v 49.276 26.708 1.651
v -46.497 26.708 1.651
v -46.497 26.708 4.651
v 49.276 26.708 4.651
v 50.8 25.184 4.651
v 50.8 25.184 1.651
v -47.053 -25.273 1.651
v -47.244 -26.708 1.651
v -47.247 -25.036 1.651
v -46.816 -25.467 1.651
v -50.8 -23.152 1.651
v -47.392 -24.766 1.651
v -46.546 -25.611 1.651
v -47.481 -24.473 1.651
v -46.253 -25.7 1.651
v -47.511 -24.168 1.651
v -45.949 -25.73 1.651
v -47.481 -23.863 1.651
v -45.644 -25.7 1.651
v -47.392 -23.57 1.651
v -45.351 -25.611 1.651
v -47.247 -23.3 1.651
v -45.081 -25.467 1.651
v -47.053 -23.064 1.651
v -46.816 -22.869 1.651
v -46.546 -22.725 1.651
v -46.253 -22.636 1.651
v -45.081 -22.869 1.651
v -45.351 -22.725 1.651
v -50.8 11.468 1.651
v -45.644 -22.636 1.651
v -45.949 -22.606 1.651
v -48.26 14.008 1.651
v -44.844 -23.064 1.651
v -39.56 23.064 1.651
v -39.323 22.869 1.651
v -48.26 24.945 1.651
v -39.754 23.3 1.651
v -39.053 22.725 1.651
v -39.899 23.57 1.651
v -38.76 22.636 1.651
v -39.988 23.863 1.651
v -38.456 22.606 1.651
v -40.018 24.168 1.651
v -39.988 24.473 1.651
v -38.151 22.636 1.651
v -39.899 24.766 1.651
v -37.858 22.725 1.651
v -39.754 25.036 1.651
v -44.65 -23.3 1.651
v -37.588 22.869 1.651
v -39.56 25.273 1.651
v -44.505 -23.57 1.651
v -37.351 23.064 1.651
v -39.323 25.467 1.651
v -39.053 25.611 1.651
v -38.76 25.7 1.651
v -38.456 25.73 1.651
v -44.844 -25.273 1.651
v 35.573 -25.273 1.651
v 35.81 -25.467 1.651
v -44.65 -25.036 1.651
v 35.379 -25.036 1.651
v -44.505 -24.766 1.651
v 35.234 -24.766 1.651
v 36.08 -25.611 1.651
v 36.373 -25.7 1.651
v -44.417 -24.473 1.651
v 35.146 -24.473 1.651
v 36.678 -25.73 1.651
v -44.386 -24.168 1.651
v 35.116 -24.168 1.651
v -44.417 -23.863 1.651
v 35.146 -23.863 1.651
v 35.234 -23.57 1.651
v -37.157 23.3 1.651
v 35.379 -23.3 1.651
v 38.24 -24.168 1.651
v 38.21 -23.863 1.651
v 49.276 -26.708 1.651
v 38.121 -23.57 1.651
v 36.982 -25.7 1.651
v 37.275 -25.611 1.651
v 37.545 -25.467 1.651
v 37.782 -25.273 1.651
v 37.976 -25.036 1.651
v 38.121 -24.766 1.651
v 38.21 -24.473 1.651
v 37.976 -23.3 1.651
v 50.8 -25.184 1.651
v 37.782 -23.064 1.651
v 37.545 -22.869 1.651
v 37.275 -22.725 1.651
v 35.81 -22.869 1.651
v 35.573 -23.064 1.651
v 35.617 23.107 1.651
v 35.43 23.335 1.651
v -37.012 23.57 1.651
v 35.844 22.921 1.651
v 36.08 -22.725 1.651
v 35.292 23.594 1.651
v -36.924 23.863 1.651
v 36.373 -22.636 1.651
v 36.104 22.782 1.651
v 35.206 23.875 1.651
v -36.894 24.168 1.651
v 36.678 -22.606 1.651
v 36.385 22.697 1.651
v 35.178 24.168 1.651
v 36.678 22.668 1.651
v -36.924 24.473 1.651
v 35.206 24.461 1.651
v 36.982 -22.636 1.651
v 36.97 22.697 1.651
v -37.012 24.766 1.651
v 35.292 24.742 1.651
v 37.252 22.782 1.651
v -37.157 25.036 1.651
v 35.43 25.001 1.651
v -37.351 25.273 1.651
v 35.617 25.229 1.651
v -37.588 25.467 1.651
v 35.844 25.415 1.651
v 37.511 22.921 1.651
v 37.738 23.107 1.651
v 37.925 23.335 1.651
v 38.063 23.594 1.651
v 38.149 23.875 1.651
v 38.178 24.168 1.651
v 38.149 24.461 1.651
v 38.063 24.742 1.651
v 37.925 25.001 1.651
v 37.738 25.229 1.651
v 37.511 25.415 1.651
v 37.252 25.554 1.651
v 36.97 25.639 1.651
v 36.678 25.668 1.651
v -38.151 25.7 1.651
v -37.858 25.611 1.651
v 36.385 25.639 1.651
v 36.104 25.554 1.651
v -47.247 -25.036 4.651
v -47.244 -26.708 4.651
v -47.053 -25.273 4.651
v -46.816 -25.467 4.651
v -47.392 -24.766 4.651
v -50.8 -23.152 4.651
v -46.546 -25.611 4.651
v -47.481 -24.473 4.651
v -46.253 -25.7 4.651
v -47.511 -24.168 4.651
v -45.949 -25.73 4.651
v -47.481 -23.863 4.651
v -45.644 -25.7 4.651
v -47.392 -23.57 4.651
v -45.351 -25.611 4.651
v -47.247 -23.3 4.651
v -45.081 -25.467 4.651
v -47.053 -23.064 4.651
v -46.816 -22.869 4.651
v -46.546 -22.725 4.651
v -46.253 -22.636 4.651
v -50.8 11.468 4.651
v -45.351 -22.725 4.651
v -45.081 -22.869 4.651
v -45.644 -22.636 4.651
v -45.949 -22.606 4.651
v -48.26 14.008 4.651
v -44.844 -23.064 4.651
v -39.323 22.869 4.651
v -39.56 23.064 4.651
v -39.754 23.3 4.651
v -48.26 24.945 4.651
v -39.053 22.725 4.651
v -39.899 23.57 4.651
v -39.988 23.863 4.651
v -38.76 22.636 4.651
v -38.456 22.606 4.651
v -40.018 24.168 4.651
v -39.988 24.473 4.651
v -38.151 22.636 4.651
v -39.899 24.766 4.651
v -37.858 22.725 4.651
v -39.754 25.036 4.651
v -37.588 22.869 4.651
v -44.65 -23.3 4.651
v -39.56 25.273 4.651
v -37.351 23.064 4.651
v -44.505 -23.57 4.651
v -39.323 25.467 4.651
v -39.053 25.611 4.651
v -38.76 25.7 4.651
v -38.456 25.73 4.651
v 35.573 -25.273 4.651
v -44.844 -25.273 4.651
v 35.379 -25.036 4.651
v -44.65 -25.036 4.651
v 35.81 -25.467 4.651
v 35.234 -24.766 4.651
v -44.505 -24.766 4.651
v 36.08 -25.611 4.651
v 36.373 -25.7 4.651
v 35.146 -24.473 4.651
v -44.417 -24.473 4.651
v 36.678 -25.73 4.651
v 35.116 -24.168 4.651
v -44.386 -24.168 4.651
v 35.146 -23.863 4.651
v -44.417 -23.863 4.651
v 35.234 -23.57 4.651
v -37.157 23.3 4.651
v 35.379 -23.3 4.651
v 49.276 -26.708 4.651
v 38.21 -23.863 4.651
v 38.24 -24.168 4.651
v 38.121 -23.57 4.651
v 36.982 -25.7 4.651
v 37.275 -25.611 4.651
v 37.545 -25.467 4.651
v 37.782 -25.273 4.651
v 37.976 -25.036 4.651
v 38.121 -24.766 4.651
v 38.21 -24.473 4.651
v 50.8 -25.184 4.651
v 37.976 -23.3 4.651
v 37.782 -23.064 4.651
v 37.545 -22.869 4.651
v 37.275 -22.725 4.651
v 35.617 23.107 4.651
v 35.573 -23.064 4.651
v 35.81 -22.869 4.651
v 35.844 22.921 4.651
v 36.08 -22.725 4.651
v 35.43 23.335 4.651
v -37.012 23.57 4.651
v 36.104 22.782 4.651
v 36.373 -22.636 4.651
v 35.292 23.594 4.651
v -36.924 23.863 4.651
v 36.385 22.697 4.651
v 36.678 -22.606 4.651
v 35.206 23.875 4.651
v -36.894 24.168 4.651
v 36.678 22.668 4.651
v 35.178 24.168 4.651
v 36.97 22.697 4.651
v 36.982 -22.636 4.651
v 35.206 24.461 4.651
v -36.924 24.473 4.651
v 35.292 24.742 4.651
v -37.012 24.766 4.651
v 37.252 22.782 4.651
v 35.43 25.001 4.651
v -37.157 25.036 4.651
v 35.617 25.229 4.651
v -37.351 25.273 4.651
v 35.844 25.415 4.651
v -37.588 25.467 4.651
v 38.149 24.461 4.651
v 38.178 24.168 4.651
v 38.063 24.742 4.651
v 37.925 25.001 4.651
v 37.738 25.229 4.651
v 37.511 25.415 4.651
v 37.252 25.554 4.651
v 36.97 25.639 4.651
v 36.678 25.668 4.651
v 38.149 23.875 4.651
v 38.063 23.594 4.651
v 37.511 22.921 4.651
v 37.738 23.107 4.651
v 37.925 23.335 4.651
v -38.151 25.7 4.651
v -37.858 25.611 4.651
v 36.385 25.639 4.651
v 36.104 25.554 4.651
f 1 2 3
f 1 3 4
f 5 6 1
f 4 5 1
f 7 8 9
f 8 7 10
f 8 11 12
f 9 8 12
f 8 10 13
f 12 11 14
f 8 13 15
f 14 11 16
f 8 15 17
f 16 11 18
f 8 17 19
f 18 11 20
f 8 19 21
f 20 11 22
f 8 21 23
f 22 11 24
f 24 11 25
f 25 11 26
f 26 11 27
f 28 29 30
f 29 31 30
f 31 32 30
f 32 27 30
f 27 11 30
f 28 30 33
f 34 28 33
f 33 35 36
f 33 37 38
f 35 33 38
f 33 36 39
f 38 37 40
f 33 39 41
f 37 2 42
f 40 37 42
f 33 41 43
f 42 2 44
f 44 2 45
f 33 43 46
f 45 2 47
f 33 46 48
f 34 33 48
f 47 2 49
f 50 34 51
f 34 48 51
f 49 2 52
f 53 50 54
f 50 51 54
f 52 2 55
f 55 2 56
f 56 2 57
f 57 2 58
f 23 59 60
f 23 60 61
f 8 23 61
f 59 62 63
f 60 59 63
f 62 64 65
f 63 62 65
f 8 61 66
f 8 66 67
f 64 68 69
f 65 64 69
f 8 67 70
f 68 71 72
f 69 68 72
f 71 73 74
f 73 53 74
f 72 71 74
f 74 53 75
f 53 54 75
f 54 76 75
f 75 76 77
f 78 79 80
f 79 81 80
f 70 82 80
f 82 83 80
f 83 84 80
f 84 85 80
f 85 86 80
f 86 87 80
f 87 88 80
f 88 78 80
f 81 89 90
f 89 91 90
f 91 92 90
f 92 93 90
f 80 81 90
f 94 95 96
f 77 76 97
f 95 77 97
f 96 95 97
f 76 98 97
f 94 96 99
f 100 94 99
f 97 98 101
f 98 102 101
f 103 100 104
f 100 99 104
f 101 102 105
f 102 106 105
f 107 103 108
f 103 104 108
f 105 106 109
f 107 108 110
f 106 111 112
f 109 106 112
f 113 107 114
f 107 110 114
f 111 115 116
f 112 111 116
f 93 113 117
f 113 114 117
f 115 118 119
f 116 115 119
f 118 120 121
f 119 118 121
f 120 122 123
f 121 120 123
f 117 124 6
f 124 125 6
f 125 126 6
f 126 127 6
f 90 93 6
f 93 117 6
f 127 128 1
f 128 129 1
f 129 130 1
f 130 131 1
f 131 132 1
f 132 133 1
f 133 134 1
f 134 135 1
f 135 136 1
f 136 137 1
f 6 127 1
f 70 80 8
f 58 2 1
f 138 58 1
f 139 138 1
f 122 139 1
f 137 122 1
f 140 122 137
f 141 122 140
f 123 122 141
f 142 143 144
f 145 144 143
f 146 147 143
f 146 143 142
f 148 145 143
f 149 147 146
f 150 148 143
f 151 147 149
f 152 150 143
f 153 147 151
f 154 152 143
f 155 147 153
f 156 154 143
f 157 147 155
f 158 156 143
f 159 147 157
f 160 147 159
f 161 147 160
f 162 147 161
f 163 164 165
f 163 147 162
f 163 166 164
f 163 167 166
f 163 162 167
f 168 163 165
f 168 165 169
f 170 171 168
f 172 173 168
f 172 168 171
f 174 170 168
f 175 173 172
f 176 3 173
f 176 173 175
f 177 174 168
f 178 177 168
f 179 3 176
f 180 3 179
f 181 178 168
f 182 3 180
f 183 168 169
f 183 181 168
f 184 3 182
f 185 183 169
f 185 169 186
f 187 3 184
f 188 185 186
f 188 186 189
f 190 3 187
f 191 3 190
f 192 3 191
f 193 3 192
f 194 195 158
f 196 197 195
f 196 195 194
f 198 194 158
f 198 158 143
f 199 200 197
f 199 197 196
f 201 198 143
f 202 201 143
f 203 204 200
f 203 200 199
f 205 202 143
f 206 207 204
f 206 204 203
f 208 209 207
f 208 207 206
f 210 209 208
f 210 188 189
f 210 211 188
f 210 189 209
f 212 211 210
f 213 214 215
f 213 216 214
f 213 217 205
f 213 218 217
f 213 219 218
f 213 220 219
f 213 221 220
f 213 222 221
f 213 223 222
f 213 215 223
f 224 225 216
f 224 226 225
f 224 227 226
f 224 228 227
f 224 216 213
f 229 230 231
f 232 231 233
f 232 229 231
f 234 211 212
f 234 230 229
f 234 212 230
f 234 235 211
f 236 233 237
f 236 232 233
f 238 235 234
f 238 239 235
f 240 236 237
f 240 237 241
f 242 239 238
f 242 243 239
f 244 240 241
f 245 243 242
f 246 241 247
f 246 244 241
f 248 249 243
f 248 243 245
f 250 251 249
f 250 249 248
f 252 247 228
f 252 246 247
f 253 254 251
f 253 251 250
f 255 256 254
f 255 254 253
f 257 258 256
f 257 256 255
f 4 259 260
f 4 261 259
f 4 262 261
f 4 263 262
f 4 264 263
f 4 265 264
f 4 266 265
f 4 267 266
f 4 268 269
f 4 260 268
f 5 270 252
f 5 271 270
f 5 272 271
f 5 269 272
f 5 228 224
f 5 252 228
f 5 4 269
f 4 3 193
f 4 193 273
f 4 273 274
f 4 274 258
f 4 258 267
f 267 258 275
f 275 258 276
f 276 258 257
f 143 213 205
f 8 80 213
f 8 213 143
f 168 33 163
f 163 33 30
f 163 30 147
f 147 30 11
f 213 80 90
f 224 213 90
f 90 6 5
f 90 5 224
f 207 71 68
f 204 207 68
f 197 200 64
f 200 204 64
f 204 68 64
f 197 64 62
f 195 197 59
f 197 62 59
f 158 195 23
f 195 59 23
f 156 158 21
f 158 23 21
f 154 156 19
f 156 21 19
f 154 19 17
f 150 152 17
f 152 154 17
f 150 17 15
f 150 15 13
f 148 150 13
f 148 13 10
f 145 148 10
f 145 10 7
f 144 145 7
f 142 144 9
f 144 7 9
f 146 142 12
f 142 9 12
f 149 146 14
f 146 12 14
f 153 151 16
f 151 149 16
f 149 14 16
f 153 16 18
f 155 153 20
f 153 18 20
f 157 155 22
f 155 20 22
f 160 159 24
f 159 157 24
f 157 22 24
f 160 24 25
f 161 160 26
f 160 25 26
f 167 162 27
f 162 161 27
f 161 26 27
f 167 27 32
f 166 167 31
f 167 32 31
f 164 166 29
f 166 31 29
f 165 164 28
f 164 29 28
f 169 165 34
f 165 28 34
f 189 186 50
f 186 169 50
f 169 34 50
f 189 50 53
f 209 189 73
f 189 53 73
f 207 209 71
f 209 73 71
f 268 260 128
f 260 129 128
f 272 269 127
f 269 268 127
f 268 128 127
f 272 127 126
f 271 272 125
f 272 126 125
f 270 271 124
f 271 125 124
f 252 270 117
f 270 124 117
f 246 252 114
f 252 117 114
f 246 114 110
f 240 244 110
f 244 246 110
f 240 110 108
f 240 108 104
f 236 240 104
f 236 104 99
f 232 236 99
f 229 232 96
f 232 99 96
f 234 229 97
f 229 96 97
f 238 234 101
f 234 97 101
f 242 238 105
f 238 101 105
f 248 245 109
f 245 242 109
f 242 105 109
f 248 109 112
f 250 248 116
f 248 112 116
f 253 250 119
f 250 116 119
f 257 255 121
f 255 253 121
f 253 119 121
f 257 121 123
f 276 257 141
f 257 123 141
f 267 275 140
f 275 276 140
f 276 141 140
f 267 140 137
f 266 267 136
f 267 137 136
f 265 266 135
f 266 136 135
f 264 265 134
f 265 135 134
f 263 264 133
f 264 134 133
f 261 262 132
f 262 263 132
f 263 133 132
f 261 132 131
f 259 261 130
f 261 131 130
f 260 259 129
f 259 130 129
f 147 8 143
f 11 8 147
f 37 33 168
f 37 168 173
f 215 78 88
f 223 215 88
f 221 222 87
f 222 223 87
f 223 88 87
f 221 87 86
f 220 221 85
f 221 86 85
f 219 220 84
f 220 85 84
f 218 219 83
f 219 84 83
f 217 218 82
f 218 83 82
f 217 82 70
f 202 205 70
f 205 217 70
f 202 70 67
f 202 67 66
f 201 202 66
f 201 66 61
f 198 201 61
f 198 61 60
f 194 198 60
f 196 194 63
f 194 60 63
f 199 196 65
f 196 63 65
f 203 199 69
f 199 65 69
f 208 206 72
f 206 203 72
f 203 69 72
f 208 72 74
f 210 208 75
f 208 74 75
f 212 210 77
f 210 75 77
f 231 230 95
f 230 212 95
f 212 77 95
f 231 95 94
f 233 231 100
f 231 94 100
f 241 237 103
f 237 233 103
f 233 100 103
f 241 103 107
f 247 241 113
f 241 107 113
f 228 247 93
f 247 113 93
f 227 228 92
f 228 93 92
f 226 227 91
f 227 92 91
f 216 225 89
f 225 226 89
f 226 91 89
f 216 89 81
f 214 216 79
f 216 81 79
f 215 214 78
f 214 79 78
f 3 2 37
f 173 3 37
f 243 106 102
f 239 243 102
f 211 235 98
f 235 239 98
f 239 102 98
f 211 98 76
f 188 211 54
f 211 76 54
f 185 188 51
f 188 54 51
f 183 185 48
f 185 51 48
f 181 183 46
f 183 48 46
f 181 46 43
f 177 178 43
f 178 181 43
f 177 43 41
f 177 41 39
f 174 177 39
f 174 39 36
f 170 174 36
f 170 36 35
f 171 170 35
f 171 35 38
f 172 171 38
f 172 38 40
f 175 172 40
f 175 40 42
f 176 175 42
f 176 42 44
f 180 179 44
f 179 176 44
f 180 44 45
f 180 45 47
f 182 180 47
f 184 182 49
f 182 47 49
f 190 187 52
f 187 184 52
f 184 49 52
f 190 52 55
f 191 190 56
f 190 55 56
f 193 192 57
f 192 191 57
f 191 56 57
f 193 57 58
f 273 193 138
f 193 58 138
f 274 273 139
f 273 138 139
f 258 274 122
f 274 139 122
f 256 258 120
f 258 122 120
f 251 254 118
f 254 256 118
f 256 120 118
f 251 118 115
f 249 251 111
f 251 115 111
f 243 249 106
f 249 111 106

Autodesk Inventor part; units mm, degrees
ref_plane "YZ Plane" through (0, 0, 0) normal (1, 0, 0) x (0, 1, 0)
ref_plane "XZ Plane" through (0, 0, 0) normal (0, 1, 0) x (-1, 0, 0)
ref_plane "Work Plane1" through (-47.244, -26.7081, 1.651) normal (0, 0, 1) x (1, 0, 0)
sketch "Sketch1" plane through (-47.244, -26.7081, 1.651) normal (0, 0, 1) x (1, 0, 0)
  line L0 (-3.556, 38.1762) -> (-3.556, 3.556) projected
  line L1 (-1.016, 40.7162) -> (-3.556, 38.1762) projected
  line L2 (-3.556, 38.1762) -> (-1.016, 40.7162)
  line L3 (0.7474, 53.4162) -> (-1.016, 51.6528) projected
  line L4 (-1.016, 40.7162) -> (-1.016, 51.6528)
  line L5 (-1.016, 51.6528) -> (0.7474, 53.4162)
  line L6 (98.044, 51.8922) -> (96.52, 53.4162) projected
  line L7 (0.7474, 53.4162) -> (96.52, 53.4162)
  line L8 (96.52, 53.4162) -> (98.044, 51.8922)
  line L9 (96.52, 0) -> (98.044, 1.524) projected
  line L10 (98.044, 51.8922) -> (98.044, 1.524)
  line L11 (98.044, 1.524) -> (96.52, 0)
  line L12 (0, 0) -> (-3.556, 3.556) projected
  line L13 (96.52, 0) -> (0, 0)
  line L14 (0, 0) -> (-3.556, 3.556)
  line L15 (-3.556, 3.556) -> (-3.556, 38.1762)
  circle A0 centre (8.7884, 50.8762) radius 1.5621 projected
  circle A1 centre (8.7884, 50.8762) radius 1.5
  circle A2 centre (83.9216, 50.8762) radius 1.5
  circle A3 centre (83.9216, 2.54) radius 1.5621 projected
  circle A4 centre (83.9216, 2.54) radius 1.5
  circle A5 centre (1.2954, 2.54) radius 1.5621 projected
  circle A6 centre (1.2954, 2.54) radius 1.5
  point P0 (47.244, 26.7081)
  dimension "d1" = 3
  dimension "d2" = 3
  dimension "d3" = 3
  dimension "d4" = 3
extrude "Extrusion1" add sketch "Sketch1" along normal blind 3 contours L1 L4 L3 L7 L6 L10 L9 L13 L12 L0
sketch "Sketch2" plane through (-47.244, -26.7081, 4.651) normal (0, 0, 1) x (1, 0, 0)
  line L0 (-3.556, 38.1762) -> (-3.556, 3.556) projected
  line L1 (-3.556, 3.556) -> (98.044, 3.556)
  line L2 (98.044, 3.556) -> (98.044, -11.444)
  line L3 (98.044, -11.444) -> (-3.556, -11.444)
  line L4 (-3.556, -11.444) -> (-3.556, 3.556)
  point P0 (47.244, 26.7081)
  dimension "d7" = 15
properties part number "arduino_holder"
